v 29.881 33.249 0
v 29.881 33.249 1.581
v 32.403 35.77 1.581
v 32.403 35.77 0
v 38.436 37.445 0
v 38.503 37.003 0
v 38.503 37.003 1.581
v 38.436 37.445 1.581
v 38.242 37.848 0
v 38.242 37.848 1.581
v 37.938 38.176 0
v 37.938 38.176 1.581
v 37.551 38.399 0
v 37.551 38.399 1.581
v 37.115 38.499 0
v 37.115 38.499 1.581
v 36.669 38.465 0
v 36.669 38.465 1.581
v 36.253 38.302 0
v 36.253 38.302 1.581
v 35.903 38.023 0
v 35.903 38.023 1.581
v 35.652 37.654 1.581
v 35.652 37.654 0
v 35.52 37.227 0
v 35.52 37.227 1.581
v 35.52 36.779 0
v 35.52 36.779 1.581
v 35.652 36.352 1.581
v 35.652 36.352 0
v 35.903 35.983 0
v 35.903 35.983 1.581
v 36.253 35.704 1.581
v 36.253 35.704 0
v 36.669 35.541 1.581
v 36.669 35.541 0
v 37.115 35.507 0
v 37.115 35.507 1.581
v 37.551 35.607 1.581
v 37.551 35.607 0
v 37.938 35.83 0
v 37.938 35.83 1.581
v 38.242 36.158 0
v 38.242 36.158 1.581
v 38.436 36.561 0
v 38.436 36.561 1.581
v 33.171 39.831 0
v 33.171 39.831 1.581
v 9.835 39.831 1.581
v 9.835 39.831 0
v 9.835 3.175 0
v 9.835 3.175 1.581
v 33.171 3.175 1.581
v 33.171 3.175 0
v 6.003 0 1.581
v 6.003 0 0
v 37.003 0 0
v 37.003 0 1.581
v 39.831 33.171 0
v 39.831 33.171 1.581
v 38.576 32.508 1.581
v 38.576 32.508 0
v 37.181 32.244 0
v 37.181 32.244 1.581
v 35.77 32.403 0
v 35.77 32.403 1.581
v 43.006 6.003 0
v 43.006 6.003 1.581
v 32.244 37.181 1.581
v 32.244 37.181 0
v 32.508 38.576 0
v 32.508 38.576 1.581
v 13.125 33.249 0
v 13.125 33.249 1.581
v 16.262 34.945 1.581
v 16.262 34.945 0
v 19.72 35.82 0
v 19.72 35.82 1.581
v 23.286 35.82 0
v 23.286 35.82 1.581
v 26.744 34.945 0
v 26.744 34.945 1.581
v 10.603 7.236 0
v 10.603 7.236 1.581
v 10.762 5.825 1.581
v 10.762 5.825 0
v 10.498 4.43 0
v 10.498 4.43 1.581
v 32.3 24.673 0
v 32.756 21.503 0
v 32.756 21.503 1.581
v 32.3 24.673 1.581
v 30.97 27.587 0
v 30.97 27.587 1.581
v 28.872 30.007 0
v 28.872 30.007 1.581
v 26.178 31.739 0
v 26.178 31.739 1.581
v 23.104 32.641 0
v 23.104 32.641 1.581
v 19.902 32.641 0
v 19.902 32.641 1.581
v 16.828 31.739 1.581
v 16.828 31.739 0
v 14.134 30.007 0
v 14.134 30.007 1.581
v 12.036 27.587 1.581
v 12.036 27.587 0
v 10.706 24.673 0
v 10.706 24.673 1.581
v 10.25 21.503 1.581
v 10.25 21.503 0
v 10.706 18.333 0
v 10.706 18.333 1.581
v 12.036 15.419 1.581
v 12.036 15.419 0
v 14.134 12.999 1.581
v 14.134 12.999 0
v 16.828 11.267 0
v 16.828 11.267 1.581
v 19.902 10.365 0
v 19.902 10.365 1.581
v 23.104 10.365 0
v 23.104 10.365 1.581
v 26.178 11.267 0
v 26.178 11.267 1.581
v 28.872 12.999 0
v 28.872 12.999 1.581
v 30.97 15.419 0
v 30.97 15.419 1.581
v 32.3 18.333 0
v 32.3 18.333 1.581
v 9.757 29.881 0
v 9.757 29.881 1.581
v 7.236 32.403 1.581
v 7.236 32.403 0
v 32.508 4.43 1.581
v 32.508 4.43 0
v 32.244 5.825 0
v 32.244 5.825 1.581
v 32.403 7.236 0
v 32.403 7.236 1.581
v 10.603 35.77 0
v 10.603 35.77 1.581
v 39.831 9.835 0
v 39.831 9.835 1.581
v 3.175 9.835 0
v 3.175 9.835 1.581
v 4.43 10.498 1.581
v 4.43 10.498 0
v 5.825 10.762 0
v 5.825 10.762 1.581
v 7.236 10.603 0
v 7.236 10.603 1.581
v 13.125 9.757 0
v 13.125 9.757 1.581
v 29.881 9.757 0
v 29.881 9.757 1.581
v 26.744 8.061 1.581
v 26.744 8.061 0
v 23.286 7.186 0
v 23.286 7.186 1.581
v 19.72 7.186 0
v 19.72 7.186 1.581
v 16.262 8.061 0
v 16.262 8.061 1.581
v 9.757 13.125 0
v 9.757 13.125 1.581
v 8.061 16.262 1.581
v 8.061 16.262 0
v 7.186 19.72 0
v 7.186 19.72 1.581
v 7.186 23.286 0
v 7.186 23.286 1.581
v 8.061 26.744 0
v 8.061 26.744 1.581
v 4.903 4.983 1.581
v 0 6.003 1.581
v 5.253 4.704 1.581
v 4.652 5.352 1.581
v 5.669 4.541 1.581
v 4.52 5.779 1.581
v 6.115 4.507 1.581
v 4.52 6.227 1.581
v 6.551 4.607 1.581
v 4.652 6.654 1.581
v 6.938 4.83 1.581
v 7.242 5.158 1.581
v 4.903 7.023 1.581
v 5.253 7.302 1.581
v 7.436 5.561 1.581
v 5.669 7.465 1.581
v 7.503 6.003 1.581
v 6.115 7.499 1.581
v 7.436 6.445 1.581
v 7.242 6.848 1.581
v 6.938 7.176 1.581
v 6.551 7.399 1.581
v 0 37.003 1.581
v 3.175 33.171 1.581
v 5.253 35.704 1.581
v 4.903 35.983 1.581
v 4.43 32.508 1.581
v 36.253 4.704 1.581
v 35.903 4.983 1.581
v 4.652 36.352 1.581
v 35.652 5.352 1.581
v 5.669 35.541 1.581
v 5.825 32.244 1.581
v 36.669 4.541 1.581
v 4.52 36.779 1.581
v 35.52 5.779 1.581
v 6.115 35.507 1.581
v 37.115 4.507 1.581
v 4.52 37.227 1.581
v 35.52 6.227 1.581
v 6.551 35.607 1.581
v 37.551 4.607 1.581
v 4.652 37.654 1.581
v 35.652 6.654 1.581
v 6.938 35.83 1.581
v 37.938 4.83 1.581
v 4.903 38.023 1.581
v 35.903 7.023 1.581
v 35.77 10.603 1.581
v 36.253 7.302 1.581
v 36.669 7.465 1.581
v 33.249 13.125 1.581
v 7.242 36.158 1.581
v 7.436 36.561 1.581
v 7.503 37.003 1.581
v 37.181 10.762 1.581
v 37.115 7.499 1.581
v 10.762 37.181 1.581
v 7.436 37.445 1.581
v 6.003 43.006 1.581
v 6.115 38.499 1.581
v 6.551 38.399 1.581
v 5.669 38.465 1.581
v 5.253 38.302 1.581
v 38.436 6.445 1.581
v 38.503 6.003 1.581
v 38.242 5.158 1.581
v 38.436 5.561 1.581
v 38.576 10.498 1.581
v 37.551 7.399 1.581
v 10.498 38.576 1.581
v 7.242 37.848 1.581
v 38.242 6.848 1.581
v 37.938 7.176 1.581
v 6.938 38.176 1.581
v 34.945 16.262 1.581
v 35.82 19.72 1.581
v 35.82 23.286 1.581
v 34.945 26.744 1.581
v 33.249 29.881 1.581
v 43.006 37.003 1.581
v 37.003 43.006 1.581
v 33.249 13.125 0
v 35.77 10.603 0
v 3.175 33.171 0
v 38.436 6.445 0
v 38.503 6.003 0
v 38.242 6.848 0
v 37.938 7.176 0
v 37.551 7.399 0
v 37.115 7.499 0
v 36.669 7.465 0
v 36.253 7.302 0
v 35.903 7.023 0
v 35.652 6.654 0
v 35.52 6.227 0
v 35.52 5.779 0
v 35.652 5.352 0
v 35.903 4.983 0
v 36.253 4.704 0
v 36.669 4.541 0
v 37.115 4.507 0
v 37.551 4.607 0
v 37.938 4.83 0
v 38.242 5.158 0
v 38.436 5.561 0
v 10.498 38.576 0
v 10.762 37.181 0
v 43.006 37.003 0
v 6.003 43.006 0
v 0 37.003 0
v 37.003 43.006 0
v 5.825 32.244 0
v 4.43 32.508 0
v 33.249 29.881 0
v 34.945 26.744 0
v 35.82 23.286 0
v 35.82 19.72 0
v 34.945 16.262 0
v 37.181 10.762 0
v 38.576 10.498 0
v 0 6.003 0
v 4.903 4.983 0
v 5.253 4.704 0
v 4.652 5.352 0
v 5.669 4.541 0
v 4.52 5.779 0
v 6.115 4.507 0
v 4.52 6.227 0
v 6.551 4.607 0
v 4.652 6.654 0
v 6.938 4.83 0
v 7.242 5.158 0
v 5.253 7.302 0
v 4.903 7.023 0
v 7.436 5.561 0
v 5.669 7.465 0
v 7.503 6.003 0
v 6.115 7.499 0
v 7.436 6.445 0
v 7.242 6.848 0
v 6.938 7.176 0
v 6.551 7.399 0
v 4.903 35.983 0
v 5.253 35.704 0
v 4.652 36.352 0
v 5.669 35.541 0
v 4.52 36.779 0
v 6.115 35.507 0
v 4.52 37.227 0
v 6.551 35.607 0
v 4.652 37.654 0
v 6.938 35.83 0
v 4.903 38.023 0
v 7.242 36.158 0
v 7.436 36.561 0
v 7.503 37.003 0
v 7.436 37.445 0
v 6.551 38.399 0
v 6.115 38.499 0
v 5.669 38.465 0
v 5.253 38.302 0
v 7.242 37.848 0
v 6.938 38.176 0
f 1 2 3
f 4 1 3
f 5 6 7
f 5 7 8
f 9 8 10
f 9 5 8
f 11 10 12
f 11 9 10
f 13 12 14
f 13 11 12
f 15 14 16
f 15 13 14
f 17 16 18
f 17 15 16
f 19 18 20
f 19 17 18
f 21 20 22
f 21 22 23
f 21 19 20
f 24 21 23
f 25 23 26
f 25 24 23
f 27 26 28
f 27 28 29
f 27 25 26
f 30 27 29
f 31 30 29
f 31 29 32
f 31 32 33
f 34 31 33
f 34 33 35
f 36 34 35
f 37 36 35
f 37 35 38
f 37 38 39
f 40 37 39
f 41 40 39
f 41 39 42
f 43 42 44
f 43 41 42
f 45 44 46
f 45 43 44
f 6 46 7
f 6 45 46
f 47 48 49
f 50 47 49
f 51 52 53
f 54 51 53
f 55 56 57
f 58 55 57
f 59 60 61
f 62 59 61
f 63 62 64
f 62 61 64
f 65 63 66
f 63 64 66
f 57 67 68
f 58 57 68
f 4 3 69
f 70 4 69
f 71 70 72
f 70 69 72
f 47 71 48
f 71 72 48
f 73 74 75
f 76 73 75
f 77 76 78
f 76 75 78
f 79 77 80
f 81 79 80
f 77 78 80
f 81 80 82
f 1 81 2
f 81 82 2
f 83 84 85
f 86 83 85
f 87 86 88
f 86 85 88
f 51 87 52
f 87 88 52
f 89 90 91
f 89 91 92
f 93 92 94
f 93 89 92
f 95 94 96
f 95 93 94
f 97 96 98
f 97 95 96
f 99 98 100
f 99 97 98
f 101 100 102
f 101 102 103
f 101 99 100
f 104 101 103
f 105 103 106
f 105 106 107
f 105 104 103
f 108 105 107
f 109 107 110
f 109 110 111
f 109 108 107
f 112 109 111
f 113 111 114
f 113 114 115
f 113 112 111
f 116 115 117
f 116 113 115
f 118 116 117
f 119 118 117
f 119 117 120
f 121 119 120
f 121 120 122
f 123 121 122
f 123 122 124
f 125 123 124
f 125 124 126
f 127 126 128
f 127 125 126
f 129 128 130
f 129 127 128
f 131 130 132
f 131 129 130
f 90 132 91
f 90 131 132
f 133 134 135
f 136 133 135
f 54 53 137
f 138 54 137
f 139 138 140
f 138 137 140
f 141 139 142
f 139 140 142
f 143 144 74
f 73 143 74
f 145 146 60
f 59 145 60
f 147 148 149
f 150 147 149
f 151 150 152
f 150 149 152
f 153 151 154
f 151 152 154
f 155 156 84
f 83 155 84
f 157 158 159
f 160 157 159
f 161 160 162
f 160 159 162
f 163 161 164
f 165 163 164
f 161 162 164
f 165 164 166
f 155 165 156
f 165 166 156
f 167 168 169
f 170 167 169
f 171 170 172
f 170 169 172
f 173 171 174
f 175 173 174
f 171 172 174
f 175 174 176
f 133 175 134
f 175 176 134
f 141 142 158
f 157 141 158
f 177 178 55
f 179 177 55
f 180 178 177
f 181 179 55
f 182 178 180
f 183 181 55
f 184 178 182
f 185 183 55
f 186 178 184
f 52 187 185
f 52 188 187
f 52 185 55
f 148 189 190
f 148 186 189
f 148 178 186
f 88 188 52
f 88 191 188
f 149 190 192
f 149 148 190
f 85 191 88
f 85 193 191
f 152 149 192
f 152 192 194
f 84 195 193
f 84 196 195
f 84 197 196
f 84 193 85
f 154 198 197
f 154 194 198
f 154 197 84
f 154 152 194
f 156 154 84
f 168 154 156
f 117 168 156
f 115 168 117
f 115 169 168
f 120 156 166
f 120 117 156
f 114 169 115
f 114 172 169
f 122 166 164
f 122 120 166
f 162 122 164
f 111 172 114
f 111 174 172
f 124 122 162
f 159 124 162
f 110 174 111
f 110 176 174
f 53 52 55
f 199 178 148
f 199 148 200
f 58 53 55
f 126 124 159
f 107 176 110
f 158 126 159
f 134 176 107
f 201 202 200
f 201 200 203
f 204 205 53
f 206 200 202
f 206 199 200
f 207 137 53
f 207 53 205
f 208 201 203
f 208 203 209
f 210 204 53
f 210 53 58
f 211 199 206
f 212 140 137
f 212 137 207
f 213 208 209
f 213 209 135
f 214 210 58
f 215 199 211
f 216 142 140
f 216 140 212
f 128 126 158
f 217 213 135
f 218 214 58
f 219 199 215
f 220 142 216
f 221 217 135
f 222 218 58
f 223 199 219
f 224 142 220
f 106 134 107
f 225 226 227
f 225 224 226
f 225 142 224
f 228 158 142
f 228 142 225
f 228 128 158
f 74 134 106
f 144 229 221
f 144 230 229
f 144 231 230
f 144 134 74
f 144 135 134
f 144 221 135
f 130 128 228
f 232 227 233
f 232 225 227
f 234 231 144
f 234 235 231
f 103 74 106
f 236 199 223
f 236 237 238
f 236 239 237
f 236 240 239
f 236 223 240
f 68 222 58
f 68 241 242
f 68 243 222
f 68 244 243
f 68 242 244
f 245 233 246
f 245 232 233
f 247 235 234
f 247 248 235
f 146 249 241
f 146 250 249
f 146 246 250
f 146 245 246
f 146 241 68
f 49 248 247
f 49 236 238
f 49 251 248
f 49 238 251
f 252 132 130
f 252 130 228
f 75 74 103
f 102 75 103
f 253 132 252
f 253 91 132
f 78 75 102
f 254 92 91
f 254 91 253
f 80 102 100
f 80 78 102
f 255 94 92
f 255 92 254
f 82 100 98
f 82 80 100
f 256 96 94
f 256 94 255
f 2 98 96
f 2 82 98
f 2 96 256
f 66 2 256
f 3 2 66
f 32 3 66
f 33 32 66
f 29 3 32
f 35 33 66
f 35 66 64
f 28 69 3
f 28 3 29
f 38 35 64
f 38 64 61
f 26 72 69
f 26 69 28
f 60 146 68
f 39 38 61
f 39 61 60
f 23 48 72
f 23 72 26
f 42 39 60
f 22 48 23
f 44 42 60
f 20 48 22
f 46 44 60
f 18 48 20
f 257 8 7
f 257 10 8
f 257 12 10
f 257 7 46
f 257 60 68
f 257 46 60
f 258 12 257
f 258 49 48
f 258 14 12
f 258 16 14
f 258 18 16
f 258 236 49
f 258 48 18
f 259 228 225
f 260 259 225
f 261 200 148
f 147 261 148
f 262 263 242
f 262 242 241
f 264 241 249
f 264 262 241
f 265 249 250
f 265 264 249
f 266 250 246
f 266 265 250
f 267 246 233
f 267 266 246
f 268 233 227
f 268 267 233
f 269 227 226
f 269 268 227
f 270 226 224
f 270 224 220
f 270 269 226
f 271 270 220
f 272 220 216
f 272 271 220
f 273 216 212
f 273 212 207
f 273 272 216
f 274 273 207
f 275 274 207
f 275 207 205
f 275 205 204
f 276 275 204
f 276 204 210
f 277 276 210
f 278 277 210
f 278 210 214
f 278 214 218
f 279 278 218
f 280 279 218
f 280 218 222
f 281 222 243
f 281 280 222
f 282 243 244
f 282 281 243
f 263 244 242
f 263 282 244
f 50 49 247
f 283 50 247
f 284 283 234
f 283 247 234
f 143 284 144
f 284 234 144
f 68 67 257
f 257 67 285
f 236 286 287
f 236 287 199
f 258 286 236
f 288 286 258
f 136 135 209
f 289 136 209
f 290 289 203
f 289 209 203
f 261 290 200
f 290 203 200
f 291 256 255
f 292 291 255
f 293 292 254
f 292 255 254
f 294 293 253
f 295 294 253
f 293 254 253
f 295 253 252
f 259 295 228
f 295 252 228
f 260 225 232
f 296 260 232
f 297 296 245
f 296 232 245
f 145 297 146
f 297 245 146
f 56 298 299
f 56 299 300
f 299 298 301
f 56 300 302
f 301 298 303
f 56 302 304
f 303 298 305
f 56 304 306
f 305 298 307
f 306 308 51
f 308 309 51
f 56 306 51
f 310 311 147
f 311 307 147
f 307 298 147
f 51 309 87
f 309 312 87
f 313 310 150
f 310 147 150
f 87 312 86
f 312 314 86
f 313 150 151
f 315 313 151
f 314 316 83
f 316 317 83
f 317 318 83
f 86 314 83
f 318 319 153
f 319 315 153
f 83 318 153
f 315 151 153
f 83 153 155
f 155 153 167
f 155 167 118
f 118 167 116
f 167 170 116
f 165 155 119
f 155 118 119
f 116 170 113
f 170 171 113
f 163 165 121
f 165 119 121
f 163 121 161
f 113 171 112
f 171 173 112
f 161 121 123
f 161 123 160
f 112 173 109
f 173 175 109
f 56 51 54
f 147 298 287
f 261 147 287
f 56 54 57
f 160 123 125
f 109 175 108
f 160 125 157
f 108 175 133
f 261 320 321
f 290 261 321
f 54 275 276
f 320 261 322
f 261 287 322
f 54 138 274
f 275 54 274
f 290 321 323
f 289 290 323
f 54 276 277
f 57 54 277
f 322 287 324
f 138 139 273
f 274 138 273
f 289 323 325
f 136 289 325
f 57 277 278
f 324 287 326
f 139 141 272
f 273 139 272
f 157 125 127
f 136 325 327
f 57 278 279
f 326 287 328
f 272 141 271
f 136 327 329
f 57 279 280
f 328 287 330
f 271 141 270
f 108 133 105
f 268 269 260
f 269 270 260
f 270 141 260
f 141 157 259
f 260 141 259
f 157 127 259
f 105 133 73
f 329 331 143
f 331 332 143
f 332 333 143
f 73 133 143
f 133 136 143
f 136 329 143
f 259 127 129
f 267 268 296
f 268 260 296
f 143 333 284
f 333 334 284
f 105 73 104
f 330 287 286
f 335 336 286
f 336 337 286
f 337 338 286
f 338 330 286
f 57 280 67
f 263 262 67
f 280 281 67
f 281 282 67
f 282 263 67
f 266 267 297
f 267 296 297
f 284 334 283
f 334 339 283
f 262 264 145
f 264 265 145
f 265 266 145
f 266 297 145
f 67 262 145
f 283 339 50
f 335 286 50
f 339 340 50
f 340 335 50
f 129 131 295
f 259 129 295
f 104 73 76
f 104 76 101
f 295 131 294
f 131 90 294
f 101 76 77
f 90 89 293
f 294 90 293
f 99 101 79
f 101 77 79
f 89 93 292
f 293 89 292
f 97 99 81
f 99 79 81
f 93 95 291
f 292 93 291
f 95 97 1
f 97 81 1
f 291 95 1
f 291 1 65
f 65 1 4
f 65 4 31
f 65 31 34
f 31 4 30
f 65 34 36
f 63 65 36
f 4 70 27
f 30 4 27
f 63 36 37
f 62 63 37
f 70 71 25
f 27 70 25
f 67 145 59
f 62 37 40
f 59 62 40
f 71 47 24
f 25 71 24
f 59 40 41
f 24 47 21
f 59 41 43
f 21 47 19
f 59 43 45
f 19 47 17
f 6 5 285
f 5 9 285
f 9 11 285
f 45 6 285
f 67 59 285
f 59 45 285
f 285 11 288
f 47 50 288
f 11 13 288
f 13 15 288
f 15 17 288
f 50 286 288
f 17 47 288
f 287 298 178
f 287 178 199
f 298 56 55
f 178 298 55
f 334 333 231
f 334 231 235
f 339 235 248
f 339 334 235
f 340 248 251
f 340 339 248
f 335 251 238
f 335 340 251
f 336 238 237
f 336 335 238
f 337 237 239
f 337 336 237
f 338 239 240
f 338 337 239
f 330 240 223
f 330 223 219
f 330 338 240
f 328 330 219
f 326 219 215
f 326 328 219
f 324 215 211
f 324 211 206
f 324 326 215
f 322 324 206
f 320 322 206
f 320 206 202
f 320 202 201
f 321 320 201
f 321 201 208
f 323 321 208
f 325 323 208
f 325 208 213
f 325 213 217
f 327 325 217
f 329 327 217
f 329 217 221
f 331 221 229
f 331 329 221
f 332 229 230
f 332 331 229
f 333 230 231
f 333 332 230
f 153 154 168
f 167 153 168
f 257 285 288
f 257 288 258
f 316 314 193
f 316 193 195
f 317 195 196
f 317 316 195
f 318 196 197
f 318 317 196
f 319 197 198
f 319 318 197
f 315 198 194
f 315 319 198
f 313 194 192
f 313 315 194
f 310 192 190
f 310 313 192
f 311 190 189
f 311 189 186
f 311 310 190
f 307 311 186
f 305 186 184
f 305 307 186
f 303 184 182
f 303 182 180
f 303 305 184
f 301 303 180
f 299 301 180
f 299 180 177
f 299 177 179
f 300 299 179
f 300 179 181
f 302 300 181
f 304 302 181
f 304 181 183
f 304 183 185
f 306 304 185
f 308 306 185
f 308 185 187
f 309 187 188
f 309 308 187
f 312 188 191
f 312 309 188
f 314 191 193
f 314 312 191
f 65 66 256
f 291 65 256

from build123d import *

# Parameters (mm, degrees)
F0_W            = 43.0059846
F0_H            = 43.0059846
F0_R            = 1.5
F0_R_2          = 11.2530001
F1_DEPTH        = 1.58115
F2_SIZE         = 6.0030106
F4_DEPTH        = 1.58115
F4_COPIES_COUNT = 4


# Not quite as in the source:
# - a pattern or mirror of a feature is missing from the dataset's text; its kind, count and spacing are read off the source's solid


with BuildPart() as f1:
    # F0 (on Top) → F1 (new body)
    with BuildSketch(Plane.XY):
        with Locations((21.5029923, 21.5029923)):
            Rectangle(F0_W, F0_H)
        with Locations((6.0029979, 6.0029979)):
            Circle(F0_R, mode=Mode.SUBTRACT)
        with Locations((21.5029923, 21.5029923)):
            Circle(F0_R_2, mode=Mode.SUBTRACT)
        with Locations((37.0029867, 6.0029979)):
            Circle(F0_R, mode=Mode.SUBTRACT)
        with Locations((6.0029979, 37.0029867)):
            Circle(F0_R, mode=Mode.SUBTRACT)
        with Locations((37.0029867, 37.0029867)):
            Circle(F0_R, mode=Mode.SUBTRACT)
    extrude(amount=F1_DEPTH)

    # F2
    f2_edges = [f1.edges().sort_by_distance(p)[0] for p in [
        (0, 0, 0.790575),
        (0, 43.005985, 0.790575),
        (43.005985, 0, 0.790575),
        (43.005985, 43.005985, 0.790575),
    ]]
    chamfer(f2_edges, length=F2_SIZE)

    # F3 (on face) → F4 (cut, through all)
    with BuildSketch(Plane.XY.offset(1.58115)):
        with BuildLine():
            ThreePointArc((7.2356236023, 32.4027649523), (5.1176370603, 32.3235056996), (3.175, 33.171037571))
            Line((3.175, 33.171037571), (3.175, 9.834947029))
            ThreePointArc((3.175, 9.834947029), (5.1176370603, 10.6824789004), (7.2356236023, 10.6032196477))
            Line((7.2356236023, 10.6032196477), (9.7569670059, 13.1245630513))
            ThreePointArc((9.7569670059, 13.1245630513), (7.0749922, 21.5029923), (9.7569670059, 29.8814215487))
            Line((9.7569670059, 29.8814215487), (7.2356236023, 32.4027649523))
        make_face()
    f4 = extrude(amount=-F4_DEPTH, mode=Mode.SUBTRACT)

    # F4_copies: F4 ×4 about axis
    f4_copies_axis = Axis((21.502992, 21.502992, 0), (0, 0, 1))
    for i in range(1, F4_COPIES_COUNT):
        add(f4.rotate(f4_copies_axis, i * 360 / F4_COPIES_COUNT), mode=Mode.SUBTRACT)


solid = f1.part
